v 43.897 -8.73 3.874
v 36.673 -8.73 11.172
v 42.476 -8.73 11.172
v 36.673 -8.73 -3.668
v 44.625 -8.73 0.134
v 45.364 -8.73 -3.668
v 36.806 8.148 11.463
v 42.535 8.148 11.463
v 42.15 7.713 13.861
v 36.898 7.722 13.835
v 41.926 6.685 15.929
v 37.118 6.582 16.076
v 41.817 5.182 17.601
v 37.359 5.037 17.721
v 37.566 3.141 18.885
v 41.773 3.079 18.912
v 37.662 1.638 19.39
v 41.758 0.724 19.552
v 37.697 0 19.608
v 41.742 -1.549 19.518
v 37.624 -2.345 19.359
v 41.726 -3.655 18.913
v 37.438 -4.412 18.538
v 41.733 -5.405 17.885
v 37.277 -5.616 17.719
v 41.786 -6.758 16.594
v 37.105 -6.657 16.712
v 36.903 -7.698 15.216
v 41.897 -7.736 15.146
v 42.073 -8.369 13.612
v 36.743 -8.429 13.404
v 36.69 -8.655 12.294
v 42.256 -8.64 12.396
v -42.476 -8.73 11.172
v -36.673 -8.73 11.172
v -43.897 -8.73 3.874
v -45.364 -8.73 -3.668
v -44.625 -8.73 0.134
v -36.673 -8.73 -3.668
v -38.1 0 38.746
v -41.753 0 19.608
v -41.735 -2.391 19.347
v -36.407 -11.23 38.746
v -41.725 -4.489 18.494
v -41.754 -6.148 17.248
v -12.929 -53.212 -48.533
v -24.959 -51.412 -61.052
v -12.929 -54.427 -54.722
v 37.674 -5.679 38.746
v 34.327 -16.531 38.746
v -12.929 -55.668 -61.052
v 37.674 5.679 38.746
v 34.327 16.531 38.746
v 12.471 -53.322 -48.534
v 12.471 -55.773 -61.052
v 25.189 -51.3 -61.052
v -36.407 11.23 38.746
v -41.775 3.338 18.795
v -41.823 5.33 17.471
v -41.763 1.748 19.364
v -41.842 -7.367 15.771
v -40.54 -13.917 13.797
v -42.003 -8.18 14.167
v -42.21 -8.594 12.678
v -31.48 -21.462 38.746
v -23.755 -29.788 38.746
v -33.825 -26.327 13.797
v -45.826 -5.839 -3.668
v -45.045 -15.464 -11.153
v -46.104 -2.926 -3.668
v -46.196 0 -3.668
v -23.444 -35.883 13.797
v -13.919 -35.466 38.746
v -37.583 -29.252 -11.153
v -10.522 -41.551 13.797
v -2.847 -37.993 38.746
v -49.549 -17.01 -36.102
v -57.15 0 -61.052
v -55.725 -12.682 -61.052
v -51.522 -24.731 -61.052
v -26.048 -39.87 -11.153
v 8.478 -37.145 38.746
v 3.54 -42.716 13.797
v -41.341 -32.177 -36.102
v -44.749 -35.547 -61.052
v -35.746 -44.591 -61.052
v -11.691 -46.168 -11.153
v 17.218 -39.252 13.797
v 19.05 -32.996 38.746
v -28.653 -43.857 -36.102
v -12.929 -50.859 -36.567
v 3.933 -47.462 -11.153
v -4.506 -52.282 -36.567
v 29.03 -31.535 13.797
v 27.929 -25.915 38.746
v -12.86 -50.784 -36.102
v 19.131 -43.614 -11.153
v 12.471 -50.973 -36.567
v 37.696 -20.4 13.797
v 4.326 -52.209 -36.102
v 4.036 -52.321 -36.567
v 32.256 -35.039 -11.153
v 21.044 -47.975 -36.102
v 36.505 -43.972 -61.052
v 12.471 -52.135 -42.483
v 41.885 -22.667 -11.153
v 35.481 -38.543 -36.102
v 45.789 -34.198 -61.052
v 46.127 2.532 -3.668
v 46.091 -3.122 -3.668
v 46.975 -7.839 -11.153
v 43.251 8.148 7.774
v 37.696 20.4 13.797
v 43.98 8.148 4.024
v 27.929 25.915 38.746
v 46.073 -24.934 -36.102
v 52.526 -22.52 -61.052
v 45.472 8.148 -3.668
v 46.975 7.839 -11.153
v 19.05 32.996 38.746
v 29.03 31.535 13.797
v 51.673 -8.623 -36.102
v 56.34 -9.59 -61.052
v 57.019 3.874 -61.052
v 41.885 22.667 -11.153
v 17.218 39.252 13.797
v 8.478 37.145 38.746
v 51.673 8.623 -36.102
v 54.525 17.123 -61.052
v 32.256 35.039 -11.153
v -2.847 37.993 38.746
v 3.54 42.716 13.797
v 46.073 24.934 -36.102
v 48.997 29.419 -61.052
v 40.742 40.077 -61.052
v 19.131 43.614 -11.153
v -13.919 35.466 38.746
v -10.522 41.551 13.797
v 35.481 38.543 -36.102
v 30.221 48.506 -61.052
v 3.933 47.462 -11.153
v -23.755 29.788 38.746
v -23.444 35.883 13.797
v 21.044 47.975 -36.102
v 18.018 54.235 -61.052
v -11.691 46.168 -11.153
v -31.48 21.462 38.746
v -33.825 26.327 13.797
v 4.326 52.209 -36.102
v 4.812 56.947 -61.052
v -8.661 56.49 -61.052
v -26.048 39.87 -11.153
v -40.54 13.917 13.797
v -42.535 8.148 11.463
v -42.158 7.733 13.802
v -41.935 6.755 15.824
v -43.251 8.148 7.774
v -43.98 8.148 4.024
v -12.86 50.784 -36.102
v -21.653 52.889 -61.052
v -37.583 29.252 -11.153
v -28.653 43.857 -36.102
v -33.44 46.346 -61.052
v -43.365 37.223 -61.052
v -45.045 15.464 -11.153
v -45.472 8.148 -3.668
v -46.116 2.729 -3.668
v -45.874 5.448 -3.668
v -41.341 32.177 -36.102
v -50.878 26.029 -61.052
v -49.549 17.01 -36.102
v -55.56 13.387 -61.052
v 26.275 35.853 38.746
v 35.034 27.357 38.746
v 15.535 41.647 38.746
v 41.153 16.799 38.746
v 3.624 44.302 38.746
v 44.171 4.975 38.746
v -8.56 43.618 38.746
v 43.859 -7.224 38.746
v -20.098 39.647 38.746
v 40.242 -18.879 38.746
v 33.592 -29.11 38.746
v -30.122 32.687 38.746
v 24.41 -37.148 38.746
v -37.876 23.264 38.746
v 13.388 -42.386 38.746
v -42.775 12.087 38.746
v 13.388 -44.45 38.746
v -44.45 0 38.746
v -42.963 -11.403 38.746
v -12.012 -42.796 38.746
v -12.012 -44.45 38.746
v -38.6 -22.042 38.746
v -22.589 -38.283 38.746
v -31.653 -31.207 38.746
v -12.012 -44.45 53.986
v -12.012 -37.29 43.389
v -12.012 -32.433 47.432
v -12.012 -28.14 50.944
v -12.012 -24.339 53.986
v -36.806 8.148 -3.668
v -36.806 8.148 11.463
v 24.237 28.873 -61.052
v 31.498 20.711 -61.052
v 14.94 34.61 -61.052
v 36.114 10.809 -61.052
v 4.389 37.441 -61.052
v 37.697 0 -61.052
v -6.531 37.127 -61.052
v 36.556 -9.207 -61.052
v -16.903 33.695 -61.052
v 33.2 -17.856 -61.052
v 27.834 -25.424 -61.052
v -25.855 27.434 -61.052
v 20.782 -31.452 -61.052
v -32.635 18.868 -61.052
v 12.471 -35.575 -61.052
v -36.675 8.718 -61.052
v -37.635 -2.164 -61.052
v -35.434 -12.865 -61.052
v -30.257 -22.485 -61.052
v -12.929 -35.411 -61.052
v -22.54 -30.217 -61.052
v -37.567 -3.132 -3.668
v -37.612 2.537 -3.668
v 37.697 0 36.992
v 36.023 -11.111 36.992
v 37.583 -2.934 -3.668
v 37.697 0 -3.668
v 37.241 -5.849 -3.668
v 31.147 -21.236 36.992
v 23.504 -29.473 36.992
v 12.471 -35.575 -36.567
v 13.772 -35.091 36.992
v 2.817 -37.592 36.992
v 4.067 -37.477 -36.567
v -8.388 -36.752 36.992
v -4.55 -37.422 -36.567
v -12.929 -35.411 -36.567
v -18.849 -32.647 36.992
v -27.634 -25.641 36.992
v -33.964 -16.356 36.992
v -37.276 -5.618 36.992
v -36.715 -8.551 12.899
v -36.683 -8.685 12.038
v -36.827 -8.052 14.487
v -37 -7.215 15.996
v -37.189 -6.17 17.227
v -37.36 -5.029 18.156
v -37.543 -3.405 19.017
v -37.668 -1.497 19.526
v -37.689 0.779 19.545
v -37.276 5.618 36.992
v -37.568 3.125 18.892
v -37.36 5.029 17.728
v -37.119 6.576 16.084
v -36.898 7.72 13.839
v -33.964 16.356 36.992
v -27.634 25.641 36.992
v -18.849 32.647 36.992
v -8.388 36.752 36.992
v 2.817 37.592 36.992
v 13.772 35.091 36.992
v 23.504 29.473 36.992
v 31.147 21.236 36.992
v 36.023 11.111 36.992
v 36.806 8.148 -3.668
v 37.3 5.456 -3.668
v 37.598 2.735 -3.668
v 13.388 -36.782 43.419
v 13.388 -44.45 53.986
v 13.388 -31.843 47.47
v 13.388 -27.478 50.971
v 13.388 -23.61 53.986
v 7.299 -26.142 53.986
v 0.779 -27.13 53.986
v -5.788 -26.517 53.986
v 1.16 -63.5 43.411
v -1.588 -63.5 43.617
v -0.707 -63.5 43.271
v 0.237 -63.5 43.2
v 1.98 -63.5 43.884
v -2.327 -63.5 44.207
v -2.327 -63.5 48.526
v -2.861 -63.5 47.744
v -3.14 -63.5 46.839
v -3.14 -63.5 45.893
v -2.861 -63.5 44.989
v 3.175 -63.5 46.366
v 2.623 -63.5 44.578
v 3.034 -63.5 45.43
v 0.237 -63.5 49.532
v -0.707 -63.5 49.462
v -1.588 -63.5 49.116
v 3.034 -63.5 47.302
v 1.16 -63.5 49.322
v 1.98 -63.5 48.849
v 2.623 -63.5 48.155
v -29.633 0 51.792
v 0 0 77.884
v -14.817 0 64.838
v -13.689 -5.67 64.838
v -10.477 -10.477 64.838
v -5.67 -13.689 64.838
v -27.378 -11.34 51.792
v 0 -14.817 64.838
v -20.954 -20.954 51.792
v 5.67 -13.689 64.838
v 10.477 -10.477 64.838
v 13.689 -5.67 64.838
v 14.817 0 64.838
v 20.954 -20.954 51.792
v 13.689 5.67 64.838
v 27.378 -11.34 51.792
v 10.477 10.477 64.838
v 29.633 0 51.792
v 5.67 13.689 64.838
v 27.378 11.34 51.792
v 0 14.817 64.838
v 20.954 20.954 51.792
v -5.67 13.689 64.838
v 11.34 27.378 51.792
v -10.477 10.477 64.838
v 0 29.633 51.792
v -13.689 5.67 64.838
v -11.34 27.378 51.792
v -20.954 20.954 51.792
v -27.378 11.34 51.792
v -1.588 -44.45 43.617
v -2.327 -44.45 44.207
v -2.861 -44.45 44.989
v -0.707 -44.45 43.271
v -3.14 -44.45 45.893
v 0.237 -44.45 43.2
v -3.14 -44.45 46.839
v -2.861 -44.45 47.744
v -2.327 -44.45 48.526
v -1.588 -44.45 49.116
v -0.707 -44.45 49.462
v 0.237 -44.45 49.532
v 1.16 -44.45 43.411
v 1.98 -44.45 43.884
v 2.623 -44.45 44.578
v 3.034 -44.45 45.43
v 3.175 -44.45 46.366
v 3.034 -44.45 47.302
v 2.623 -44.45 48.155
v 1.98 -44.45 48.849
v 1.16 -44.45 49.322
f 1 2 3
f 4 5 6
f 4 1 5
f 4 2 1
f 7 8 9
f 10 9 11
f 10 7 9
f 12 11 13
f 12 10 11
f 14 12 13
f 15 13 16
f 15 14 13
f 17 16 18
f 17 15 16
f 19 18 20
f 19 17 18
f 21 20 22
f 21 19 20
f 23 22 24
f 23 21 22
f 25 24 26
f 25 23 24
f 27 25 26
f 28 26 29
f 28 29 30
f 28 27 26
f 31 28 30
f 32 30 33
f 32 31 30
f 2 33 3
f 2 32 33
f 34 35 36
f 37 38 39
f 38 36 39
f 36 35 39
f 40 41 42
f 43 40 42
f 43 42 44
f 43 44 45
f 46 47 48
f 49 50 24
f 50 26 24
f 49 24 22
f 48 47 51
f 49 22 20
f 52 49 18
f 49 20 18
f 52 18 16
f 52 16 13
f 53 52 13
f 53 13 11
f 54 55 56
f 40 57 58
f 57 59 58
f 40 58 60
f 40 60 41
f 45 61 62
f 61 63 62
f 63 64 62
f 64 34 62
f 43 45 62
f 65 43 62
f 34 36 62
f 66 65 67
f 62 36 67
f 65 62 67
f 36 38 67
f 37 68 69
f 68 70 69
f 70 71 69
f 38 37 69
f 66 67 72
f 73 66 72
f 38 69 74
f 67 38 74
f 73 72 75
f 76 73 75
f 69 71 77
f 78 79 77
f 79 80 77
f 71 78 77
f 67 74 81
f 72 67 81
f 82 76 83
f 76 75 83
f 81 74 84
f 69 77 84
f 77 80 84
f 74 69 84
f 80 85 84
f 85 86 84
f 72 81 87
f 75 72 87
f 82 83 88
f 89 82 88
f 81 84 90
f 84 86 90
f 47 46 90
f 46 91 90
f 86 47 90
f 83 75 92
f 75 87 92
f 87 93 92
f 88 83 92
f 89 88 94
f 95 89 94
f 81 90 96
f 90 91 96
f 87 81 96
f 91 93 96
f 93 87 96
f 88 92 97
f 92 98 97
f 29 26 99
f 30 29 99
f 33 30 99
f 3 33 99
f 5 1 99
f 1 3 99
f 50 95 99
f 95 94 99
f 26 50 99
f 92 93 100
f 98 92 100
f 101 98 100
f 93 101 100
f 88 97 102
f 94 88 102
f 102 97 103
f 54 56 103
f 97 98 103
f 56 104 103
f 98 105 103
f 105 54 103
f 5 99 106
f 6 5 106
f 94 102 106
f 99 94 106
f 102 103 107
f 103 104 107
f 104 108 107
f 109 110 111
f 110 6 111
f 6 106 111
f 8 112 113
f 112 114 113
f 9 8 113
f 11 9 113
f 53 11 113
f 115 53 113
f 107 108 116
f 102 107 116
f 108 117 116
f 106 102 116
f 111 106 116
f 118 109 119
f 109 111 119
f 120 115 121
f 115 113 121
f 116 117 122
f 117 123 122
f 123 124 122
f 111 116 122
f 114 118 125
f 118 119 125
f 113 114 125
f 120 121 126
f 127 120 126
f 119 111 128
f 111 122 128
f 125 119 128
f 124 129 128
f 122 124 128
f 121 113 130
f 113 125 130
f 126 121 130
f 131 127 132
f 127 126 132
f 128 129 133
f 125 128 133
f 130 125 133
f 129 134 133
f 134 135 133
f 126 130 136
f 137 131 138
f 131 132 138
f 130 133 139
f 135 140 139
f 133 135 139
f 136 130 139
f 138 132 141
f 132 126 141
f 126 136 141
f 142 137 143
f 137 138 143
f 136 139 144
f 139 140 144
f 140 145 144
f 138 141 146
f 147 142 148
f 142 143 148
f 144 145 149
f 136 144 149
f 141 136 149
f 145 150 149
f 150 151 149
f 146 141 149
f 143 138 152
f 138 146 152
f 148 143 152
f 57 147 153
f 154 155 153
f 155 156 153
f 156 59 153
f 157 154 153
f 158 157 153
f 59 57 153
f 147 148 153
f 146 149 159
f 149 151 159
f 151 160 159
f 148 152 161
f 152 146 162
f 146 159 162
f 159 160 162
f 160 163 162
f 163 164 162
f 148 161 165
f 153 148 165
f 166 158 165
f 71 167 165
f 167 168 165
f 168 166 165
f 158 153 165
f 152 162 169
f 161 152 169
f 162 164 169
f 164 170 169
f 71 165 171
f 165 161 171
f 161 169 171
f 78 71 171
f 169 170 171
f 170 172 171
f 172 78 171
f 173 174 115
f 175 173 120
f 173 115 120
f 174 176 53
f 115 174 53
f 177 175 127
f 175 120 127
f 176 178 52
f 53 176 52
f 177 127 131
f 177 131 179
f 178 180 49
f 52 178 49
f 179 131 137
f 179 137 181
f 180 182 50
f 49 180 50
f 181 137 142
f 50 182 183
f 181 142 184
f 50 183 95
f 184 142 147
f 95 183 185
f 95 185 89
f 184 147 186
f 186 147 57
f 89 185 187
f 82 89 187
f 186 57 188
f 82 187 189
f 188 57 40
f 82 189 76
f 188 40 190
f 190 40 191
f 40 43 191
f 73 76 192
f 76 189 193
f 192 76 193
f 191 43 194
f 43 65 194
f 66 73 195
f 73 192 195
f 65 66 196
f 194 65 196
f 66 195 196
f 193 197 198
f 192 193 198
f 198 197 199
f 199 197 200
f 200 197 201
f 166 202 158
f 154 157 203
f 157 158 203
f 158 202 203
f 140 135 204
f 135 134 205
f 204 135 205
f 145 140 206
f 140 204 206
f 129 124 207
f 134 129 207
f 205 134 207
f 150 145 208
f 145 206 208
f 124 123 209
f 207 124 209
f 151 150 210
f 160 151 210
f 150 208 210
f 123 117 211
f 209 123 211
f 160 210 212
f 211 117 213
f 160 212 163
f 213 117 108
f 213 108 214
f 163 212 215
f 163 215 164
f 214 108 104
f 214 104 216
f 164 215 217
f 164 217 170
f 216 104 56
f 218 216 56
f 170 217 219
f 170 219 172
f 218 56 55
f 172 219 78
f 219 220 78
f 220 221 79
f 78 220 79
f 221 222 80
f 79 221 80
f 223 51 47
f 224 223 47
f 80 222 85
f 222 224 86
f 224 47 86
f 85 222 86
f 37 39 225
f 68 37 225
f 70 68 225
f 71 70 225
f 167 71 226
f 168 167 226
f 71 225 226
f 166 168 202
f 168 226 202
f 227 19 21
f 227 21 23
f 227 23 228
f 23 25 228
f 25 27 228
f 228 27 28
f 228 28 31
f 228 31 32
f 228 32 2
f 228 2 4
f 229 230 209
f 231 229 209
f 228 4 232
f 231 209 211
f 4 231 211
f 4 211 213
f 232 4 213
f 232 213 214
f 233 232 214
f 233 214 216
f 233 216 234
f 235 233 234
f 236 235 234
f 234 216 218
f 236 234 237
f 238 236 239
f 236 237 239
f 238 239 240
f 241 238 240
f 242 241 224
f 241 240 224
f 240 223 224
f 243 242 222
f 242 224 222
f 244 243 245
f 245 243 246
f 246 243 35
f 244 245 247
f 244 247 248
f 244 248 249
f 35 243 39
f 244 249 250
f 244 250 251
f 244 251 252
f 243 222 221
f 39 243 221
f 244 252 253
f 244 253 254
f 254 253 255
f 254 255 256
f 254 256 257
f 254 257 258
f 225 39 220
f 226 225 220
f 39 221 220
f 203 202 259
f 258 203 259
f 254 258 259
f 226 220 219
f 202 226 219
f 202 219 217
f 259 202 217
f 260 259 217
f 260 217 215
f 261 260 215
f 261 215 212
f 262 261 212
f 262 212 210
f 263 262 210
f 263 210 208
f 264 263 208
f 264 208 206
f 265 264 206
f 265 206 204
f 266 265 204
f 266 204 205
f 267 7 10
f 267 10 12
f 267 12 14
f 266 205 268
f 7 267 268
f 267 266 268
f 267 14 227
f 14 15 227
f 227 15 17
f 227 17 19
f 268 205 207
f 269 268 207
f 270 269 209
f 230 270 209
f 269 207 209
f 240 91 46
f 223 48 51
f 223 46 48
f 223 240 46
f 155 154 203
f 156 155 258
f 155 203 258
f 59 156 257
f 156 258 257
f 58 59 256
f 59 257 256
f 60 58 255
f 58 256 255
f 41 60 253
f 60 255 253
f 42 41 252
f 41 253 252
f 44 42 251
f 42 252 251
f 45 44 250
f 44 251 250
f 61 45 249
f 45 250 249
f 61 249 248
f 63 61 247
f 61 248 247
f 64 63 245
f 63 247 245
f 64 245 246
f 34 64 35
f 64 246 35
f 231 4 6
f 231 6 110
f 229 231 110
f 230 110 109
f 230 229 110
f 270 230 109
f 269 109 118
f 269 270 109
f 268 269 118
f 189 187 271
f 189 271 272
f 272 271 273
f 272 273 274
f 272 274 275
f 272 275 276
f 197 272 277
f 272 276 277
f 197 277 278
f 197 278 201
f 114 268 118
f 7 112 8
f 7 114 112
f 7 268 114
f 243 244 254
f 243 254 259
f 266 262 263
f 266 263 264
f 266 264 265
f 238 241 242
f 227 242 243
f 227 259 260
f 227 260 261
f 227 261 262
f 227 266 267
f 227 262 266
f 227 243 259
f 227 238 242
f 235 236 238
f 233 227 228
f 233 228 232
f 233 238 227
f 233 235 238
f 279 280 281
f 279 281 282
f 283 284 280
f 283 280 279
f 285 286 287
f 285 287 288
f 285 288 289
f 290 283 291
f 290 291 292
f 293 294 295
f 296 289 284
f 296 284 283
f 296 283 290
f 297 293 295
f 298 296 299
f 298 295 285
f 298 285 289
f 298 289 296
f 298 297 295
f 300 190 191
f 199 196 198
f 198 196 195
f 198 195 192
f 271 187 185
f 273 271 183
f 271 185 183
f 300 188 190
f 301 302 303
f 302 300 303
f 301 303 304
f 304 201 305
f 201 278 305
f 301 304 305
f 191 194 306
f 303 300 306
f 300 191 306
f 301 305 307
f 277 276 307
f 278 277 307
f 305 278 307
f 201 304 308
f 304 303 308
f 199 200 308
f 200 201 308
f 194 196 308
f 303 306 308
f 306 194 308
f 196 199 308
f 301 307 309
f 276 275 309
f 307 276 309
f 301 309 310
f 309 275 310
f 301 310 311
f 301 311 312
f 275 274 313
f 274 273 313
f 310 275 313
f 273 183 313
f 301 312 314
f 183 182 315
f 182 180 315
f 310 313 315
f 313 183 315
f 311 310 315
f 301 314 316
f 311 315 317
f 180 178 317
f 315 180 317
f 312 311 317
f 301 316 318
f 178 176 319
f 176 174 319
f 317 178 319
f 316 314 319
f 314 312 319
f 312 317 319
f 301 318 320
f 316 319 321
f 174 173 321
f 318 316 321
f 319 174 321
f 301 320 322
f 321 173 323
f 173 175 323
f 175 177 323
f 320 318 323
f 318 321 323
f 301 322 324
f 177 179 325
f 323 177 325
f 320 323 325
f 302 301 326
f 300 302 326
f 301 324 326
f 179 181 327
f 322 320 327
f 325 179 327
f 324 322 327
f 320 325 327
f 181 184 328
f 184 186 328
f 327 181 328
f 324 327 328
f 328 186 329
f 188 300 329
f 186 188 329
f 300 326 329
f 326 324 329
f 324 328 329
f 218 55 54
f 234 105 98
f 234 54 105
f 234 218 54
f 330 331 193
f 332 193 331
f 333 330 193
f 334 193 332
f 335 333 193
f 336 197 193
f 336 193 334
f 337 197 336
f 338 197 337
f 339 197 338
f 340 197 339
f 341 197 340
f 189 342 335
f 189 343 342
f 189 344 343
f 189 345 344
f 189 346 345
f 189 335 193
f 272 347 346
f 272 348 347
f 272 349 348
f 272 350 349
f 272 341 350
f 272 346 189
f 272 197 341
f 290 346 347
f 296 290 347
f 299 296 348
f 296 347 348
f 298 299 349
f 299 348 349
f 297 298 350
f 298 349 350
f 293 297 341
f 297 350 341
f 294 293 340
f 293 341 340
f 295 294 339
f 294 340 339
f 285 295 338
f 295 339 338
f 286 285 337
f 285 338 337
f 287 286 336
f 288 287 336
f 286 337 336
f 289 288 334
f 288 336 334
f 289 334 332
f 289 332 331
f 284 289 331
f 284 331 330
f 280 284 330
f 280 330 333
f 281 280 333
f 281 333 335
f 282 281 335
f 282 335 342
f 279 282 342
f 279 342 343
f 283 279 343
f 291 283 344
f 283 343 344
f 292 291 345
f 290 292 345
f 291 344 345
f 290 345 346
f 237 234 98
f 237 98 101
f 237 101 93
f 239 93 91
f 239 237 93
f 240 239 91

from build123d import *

# Parameters (mm, degrees)
F3_DEPTH       = 87.884
F4_R           = 37.6973348858
F5_DEPTH       = 98.044
F7_DEPTH       = 44.45
F8_R           = 3.175
F9_DEPTH       = 19.05
F11_DEPTH      = 67.564
F11_DEPTH_BACK = 62.992


with BuildPart() as f1:
    # F0 (on Front) → F1 (revolve)
    with BuildSketch(Plane.XZ):
        Polygon((0, 38.7462731748), (-38.1, 38.7462731748), (-57.15, -61.0518104742), (0, -61.0518104742), align=None)
        Polygon((-44.45, 38.7462731748), (-38.1, 38.7462731748), (0, 38.7462731748), (0, 77.8838843107), align=None)
    revolve(axis=Axis((0, 0, -11.1527686497), (0, 0, 1)))

    # F2 (on Front) → F3 (cut)
    with BuildSketch(Plane.XZ):
        Polygon((12.4711716, -36.5671299331), (0, -36.5671299331), (-12.9288284, -36.5671299331), (-12.9288284, -61.0518104742), (0, -61.0518104742), (12.4711716, -61.0518104742), align=None)
    extrude(amount=F3_DEPTH, mode=Mode.SUBTRACT)

    # F4 (on face) → F5 (cut)
    with BuildSketch(Plane(origin=(0, 0, -61.0518104742), x_dir=(1, 0, 0), z_dir=(0, 0, -1))):
        Circle(F4_R)
    extrude(amount=-F5_DEPTH, mode=Mode.SUBTRACT)

    # F6 (on Front) → F7 (join)
    with BuildSketch(Plane.XZ):
        Polygon((-12.0120554089, 38.7462731748), (0, 38.7462731748), (13.3879445911, 38.7462731748), (13.3879445911, 53.9862731748), (0, 53.9862731748), (-12.0120554089, 53.9862731748), align=None)
    extrude(amount=F7_DEPTH)

    # F8 (on face) → F9 (join)
    with BuildSketch(Plane.XZ.offset(44.45)):
        with Locations((0, 46.3662731748)):
            Circle(F8_R)
    extrude(amount=F9_DEPTH)

    # F10 (on Right) → F11 (cut, two sides)
    with BuildSketch(Plane.YZ) as f11_sk:
        with BuildLine():
            ThreePointArc((8.1476010382, 11.462922208), (-0.4339928104, 19.6117778709), (-8.7295742705, 11.1719360575))
            Line((-8.7295742705, 11.1719360575), (-8.7295742705, -3.6683375947))
            Line((-8.7295742705, -3.6683375947), (8.1476010382, -3.6683375947))
            Line((8.1476010382, -3.6683375947), (8.1476010382, 11.462922208))
        make_face()
    extrude(amount=-F11_DEPTH, mode=Mode.SUBTRACT)
    extrude(f11_sk.sketch, amount=F11_DEPTH_BACK, mode=Mode.SUBTRACT)


solid = f1.part
